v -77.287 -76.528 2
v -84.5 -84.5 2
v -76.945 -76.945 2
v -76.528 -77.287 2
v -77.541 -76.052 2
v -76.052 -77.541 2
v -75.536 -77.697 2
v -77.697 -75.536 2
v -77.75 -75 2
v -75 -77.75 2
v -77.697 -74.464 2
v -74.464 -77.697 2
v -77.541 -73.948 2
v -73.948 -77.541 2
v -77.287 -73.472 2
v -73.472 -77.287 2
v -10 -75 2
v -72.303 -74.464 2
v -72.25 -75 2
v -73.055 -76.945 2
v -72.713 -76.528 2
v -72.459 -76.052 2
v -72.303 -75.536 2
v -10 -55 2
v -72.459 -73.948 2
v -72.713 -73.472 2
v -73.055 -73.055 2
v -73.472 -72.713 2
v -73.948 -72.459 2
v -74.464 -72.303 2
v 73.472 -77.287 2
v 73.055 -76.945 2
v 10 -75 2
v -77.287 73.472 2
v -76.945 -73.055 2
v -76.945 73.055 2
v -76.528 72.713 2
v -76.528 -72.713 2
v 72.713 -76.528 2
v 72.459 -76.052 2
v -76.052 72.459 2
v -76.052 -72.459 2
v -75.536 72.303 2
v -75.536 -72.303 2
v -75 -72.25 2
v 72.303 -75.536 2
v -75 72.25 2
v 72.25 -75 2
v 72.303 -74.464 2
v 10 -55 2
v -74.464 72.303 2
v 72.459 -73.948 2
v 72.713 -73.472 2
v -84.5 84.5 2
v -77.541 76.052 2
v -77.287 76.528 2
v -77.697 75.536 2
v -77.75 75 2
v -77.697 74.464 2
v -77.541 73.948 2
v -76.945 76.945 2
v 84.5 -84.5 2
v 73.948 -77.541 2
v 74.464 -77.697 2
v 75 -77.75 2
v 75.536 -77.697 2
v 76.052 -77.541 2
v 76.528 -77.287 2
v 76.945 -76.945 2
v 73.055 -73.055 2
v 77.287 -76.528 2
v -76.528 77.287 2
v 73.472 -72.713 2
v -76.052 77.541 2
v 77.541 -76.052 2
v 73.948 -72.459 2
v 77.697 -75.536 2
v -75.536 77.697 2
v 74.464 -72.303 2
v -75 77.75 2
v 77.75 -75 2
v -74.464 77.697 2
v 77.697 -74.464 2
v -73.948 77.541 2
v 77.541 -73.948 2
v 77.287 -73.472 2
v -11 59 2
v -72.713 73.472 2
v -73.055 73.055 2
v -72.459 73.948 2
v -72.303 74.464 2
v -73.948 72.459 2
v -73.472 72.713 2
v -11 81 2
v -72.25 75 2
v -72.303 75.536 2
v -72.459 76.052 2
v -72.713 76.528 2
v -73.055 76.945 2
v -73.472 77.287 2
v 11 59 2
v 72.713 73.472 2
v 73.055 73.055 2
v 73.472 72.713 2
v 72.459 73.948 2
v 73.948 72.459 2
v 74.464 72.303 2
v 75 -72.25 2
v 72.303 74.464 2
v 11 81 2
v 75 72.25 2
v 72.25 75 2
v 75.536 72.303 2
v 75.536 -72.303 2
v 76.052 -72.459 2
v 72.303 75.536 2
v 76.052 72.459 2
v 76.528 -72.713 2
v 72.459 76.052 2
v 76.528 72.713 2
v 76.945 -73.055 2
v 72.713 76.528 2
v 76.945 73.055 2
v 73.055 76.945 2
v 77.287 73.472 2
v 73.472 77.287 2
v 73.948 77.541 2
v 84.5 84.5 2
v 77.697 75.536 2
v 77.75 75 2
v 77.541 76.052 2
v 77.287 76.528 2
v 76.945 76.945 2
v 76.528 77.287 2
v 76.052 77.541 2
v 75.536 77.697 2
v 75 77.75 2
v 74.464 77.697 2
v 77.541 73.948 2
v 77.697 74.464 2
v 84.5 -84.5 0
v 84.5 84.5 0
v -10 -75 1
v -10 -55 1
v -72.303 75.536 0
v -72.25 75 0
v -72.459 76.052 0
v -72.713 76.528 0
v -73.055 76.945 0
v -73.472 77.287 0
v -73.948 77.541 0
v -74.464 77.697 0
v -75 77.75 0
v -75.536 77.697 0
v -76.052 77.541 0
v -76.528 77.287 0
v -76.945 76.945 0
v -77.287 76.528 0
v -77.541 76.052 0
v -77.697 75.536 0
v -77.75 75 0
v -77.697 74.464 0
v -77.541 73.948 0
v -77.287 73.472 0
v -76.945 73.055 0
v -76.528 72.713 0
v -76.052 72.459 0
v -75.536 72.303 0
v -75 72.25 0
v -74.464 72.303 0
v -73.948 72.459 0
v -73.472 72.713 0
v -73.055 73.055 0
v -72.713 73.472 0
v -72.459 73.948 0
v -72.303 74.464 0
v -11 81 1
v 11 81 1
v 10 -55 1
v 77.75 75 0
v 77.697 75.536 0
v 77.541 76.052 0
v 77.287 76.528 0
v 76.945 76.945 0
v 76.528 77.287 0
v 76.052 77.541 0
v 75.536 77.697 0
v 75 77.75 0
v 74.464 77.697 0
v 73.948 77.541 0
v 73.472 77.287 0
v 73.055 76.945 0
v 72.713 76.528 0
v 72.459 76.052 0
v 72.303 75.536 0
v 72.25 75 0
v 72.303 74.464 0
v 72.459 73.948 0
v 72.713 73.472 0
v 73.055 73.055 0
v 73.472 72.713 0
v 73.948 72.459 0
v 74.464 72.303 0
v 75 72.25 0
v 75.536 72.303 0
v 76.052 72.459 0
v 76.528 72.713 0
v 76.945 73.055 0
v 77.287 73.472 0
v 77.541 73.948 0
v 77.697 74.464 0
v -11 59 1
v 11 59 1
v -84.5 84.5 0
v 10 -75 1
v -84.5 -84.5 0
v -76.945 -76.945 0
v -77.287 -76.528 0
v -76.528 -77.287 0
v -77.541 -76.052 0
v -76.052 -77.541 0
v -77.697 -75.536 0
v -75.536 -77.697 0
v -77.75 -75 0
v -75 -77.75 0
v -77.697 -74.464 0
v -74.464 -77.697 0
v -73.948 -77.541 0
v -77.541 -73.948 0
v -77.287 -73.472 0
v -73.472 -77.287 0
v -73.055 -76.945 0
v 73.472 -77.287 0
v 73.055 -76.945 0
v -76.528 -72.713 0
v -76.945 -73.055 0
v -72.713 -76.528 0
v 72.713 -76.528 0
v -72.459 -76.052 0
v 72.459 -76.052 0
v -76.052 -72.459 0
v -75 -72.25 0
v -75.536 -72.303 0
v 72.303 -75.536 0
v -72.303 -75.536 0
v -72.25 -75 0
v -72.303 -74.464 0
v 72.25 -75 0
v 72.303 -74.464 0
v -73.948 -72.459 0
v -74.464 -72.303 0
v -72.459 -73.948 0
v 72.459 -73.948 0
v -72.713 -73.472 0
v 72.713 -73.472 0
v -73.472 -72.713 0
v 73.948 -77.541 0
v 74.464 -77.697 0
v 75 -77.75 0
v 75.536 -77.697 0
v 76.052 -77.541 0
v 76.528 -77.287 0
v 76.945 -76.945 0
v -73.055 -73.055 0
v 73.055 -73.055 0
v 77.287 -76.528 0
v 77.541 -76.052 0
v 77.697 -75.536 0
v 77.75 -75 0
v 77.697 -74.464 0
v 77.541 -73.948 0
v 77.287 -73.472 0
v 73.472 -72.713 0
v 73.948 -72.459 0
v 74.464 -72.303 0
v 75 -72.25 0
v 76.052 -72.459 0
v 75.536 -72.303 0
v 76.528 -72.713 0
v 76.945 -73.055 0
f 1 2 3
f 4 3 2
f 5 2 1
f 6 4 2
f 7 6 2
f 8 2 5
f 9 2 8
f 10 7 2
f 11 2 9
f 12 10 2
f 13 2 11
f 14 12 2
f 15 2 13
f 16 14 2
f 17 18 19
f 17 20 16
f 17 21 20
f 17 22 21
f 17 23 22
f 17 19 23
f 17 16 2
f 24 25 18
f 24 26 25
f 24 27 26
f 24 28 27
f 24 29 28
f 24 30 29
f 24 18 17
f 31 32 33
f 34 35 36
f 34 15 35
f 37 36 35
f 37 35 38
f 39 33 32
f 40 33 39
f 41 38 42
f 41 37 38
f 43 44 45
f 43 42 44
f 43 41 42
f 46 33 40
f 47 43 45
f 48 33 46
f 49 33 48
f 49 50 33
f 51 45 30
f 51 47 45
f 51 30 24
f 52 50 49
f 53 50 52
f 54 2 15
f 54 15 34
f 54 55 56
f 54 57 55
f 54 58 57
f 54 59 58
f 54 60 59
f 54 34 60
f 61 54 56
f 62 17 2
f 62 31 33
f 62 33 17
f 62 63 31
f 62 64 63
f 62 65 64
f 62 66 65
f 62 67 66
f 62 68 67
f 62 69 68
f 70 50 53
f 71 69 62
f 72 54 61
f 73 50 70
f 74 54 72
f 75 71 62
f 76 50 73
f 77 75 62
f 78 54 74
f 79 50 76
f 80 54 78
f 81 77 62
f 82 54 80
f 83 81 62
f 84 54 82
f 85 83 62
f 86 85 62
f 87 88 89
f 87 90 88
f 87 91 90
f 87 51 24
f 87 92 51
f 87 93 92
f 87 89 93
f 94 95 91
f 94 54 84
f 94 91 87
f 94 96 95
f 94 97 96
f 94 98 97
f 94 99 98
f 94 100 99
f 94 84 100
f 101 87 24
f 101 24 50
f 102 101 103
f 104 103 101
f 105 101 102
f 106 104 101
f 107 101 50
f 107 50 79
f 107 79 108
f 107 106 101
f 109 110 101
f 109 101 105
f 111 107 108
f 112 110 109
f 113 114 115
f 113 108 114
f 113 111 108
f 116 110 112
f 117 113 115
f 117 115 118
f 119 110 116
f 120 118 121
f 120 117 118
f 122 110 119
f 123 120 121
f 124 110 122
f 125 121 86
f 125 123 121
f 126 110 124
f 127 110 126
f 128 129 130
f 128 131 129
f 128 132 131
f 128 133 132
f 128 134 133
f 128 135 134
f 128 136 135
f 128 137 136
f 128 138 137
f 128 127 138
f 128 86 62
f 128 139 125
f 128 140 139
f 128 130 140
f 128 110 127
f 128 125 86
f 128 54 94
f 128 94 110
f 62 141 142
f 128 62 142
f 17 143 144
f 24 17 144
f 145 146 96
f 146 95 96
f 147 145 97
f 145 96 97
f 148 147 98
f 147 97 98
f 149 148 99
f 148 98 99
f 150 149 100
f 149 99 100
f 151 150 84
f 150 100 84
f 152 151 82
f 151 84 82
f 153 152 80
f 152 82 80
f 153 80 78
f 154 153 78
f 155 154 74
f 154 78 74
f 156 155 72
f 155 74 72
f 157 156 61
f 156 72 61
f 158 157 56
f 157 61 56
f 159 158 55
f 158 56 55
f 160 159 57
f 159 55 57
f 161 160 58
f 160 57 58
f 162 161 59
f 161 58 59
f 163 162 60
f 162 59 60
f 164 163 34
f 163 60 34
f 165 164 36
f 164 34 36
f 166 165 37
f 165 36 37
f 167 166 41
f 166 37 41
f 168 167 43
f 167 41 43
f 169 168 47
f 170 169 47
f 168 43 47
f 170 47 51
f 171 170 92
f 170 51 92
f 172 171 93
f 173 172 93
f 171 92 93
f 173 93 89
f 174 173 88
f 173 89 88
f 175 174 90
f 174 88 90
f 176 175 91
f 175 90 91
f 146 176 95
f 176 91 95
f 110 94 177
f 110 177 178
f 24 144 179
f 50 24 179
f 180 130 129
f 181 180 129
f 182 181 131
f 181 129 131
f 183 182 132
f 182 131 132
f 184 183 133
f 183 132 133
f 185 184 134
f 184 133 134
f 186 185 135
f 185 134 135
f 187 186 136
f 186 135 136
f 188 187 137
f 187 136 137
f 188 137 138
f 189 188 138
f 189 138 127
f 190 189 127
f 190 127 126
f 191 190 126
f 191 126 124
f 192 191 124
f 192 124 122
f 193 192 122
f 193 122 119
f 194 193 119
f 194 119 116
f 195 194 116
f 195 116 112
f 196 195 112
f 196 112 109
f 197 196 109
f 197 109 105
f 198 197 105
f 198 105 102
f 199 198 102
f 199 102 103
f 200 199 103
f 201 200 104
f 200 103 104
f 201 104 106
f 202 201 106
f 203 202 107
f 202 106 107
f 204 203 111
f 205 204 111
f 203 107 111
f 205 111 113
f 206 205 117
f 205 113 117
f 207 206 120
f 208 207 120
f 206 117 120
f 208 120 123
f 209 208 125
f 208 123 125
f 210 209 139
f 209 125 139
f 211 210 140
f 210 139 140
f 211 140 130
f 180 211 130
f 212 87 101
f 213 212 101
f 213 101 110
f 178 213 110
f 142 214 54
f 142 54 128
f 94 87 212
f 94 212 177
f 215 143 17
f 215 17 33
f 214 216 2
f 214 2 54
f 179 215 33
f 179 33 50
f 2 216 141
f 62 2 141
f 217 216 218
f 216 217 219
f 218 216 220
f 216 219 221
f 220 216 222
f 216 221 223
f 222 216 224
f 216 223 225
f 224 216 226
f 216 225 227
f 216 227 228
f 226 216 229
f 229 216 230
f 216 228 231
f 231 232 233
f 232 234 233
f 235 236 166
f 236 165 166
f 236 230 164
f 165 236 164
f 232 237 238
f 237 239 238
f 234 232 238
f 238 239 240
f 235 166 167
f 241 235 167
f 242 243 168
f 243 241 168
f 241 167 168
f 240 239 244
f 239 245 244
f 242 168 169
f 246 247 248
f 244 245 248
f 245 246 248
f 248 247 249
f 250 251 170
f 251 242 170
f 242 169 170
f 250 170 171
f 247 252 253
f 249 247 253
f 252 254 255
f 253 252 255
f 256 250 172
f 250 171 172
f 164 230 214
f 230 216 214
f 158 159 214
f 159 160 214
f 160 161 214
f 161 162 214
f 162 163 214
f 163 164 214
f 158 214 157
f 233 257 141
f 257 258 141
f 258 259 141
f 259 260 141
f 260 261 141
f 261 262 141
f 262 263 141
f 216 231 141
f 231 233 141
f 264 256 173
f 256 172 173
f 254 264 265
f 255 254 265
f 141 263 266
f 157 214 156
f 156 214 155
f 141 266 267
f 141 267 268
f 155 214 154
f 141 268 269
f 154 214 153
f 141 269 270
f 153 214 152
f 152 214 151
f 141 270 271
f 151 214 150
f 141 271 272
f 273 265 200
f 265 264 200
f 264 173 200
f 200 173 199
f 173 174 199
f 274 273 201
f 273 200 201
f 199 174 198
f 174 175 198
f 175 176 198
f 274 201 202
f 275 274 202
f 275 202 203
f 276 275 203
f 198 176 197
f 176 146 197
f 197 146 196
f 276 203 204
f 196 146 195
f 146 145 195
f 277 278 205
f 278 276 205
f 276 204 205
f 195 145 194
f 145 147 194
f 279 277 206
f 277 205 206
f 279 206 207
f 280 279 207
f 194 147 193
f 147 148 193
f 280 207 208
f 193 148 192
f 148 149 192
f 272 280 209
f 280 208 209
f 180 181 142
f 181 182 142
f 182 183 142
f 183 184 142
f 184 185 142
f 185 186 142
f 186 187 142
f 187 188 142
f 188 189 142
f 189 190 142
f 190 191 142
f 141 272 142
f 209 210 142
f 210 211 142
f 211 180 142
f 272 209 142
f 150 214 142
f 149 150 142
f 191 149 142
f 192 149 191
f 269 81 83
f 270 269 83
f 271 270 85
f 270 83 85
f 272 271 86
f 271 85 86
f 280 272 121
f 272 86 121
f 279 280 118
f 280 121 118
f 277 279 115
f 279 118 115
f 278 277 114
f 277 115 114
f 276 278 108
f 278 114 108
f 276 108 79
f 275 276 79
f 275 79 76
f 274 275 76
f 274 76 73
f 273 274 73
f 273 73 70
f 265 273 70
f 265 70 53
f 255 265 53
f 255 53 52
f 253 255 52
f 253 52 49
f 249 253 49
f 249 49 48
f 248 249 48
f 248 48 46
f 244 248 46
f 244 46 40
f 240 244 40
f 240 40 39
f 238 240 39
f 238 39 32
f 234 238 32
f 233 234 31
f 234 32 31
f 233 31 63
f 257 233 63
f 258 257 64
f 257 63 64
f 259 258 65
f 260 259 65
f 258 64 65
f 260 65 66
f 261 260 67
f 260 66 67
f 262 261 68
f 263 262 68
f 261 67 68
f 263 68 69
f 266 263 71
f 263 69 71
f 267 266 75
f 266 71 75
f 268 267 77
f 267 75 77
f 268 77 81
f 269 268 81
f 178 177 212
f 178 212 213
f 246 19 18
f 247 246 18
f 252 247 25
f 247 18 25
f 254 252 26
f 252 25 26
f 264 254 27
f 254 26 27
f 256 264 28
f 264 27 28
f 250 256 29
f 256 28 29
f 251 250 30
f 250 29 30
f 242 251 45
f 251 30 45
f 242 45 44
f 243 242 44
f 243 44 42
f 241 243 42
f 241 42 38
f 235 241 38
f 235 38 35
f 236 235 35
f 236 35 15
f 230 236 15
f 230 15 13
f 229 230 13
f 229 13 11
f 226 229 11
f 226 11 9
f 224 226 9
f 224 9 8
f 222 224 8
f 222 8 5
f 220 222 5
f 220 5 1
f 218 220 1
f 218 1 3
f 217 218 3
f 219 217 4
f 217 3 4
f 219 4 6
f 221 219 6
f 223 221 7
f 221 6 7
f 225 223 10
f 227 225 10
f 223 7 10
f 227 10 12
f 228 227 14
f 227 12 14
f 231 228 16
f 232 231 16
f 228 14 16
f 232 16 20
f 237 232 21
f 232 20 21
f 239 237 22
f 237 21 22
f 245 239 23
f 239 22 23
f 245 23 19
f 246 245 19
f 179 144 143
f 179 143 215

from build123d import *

# Parameters (mm, degrees)
SKETCH002_W      = 20
SKETCH002_H      = 20
SKETCH002_W_2    = 22
SKETCH002_H_2    = 22
EXTRUDE_DEPTH    = 1
SKETCH001_R      = 2.75
EXTRUDE002_DEPTH = 5
SKETCH_W         = 169
SKETCH_H         = 169
EXTRUDE001_DEPTH = 2


with BuildPart() as cutouts:
    # Sketch002 → Extrude (new body, symmetric)
    with BuildSketch(Plane.XY.offset(2)):
        with Locations((0, -65)):
            Rectangle(SKETCH002_W, SKETCH002_H)
        with Locations((0, 70)):
            Rectangle(SKETCH002_W_2, SKETCH002_H_2)
    extrude(amount=EXTRUDE_DEPTH, both=True)


with BuildPart() as mountholes:
    # Sketch001 → Extrude002 (new body, symmetric)
    with BuildSketch(Plane.XY.offset(2)):
        with Locations((-75, -75)):
            Circle(SKETCH001_R)
        with Locations((75, -75)):
            Circle(SKETCH001_R)
        with Locations((75, 75)):
            Circle(SKETCH001_R)
        with Locations((-75, 75)):
            Circle(SKETCH001_R)
    extrude(amount=EXTRUDE002_DEPTH, both=True)


with BuildPart() as cut001:
    # Sketch → Extrude001 (new body)
    with BuildSketch(Plane.XY):
        Rectangle(SKETCH_W, SKETCH_H)
    extrude(amount=EXTRUDE001_DEPTH)

    # Cut: cut MountHoles
    add(mountholes.part, mode=Mode.SUBTRACT)

    # Cut001: cut Cutouts
    add(cutouts.part, mode=Mode.SUBTRACT)


solid = cut001.part
